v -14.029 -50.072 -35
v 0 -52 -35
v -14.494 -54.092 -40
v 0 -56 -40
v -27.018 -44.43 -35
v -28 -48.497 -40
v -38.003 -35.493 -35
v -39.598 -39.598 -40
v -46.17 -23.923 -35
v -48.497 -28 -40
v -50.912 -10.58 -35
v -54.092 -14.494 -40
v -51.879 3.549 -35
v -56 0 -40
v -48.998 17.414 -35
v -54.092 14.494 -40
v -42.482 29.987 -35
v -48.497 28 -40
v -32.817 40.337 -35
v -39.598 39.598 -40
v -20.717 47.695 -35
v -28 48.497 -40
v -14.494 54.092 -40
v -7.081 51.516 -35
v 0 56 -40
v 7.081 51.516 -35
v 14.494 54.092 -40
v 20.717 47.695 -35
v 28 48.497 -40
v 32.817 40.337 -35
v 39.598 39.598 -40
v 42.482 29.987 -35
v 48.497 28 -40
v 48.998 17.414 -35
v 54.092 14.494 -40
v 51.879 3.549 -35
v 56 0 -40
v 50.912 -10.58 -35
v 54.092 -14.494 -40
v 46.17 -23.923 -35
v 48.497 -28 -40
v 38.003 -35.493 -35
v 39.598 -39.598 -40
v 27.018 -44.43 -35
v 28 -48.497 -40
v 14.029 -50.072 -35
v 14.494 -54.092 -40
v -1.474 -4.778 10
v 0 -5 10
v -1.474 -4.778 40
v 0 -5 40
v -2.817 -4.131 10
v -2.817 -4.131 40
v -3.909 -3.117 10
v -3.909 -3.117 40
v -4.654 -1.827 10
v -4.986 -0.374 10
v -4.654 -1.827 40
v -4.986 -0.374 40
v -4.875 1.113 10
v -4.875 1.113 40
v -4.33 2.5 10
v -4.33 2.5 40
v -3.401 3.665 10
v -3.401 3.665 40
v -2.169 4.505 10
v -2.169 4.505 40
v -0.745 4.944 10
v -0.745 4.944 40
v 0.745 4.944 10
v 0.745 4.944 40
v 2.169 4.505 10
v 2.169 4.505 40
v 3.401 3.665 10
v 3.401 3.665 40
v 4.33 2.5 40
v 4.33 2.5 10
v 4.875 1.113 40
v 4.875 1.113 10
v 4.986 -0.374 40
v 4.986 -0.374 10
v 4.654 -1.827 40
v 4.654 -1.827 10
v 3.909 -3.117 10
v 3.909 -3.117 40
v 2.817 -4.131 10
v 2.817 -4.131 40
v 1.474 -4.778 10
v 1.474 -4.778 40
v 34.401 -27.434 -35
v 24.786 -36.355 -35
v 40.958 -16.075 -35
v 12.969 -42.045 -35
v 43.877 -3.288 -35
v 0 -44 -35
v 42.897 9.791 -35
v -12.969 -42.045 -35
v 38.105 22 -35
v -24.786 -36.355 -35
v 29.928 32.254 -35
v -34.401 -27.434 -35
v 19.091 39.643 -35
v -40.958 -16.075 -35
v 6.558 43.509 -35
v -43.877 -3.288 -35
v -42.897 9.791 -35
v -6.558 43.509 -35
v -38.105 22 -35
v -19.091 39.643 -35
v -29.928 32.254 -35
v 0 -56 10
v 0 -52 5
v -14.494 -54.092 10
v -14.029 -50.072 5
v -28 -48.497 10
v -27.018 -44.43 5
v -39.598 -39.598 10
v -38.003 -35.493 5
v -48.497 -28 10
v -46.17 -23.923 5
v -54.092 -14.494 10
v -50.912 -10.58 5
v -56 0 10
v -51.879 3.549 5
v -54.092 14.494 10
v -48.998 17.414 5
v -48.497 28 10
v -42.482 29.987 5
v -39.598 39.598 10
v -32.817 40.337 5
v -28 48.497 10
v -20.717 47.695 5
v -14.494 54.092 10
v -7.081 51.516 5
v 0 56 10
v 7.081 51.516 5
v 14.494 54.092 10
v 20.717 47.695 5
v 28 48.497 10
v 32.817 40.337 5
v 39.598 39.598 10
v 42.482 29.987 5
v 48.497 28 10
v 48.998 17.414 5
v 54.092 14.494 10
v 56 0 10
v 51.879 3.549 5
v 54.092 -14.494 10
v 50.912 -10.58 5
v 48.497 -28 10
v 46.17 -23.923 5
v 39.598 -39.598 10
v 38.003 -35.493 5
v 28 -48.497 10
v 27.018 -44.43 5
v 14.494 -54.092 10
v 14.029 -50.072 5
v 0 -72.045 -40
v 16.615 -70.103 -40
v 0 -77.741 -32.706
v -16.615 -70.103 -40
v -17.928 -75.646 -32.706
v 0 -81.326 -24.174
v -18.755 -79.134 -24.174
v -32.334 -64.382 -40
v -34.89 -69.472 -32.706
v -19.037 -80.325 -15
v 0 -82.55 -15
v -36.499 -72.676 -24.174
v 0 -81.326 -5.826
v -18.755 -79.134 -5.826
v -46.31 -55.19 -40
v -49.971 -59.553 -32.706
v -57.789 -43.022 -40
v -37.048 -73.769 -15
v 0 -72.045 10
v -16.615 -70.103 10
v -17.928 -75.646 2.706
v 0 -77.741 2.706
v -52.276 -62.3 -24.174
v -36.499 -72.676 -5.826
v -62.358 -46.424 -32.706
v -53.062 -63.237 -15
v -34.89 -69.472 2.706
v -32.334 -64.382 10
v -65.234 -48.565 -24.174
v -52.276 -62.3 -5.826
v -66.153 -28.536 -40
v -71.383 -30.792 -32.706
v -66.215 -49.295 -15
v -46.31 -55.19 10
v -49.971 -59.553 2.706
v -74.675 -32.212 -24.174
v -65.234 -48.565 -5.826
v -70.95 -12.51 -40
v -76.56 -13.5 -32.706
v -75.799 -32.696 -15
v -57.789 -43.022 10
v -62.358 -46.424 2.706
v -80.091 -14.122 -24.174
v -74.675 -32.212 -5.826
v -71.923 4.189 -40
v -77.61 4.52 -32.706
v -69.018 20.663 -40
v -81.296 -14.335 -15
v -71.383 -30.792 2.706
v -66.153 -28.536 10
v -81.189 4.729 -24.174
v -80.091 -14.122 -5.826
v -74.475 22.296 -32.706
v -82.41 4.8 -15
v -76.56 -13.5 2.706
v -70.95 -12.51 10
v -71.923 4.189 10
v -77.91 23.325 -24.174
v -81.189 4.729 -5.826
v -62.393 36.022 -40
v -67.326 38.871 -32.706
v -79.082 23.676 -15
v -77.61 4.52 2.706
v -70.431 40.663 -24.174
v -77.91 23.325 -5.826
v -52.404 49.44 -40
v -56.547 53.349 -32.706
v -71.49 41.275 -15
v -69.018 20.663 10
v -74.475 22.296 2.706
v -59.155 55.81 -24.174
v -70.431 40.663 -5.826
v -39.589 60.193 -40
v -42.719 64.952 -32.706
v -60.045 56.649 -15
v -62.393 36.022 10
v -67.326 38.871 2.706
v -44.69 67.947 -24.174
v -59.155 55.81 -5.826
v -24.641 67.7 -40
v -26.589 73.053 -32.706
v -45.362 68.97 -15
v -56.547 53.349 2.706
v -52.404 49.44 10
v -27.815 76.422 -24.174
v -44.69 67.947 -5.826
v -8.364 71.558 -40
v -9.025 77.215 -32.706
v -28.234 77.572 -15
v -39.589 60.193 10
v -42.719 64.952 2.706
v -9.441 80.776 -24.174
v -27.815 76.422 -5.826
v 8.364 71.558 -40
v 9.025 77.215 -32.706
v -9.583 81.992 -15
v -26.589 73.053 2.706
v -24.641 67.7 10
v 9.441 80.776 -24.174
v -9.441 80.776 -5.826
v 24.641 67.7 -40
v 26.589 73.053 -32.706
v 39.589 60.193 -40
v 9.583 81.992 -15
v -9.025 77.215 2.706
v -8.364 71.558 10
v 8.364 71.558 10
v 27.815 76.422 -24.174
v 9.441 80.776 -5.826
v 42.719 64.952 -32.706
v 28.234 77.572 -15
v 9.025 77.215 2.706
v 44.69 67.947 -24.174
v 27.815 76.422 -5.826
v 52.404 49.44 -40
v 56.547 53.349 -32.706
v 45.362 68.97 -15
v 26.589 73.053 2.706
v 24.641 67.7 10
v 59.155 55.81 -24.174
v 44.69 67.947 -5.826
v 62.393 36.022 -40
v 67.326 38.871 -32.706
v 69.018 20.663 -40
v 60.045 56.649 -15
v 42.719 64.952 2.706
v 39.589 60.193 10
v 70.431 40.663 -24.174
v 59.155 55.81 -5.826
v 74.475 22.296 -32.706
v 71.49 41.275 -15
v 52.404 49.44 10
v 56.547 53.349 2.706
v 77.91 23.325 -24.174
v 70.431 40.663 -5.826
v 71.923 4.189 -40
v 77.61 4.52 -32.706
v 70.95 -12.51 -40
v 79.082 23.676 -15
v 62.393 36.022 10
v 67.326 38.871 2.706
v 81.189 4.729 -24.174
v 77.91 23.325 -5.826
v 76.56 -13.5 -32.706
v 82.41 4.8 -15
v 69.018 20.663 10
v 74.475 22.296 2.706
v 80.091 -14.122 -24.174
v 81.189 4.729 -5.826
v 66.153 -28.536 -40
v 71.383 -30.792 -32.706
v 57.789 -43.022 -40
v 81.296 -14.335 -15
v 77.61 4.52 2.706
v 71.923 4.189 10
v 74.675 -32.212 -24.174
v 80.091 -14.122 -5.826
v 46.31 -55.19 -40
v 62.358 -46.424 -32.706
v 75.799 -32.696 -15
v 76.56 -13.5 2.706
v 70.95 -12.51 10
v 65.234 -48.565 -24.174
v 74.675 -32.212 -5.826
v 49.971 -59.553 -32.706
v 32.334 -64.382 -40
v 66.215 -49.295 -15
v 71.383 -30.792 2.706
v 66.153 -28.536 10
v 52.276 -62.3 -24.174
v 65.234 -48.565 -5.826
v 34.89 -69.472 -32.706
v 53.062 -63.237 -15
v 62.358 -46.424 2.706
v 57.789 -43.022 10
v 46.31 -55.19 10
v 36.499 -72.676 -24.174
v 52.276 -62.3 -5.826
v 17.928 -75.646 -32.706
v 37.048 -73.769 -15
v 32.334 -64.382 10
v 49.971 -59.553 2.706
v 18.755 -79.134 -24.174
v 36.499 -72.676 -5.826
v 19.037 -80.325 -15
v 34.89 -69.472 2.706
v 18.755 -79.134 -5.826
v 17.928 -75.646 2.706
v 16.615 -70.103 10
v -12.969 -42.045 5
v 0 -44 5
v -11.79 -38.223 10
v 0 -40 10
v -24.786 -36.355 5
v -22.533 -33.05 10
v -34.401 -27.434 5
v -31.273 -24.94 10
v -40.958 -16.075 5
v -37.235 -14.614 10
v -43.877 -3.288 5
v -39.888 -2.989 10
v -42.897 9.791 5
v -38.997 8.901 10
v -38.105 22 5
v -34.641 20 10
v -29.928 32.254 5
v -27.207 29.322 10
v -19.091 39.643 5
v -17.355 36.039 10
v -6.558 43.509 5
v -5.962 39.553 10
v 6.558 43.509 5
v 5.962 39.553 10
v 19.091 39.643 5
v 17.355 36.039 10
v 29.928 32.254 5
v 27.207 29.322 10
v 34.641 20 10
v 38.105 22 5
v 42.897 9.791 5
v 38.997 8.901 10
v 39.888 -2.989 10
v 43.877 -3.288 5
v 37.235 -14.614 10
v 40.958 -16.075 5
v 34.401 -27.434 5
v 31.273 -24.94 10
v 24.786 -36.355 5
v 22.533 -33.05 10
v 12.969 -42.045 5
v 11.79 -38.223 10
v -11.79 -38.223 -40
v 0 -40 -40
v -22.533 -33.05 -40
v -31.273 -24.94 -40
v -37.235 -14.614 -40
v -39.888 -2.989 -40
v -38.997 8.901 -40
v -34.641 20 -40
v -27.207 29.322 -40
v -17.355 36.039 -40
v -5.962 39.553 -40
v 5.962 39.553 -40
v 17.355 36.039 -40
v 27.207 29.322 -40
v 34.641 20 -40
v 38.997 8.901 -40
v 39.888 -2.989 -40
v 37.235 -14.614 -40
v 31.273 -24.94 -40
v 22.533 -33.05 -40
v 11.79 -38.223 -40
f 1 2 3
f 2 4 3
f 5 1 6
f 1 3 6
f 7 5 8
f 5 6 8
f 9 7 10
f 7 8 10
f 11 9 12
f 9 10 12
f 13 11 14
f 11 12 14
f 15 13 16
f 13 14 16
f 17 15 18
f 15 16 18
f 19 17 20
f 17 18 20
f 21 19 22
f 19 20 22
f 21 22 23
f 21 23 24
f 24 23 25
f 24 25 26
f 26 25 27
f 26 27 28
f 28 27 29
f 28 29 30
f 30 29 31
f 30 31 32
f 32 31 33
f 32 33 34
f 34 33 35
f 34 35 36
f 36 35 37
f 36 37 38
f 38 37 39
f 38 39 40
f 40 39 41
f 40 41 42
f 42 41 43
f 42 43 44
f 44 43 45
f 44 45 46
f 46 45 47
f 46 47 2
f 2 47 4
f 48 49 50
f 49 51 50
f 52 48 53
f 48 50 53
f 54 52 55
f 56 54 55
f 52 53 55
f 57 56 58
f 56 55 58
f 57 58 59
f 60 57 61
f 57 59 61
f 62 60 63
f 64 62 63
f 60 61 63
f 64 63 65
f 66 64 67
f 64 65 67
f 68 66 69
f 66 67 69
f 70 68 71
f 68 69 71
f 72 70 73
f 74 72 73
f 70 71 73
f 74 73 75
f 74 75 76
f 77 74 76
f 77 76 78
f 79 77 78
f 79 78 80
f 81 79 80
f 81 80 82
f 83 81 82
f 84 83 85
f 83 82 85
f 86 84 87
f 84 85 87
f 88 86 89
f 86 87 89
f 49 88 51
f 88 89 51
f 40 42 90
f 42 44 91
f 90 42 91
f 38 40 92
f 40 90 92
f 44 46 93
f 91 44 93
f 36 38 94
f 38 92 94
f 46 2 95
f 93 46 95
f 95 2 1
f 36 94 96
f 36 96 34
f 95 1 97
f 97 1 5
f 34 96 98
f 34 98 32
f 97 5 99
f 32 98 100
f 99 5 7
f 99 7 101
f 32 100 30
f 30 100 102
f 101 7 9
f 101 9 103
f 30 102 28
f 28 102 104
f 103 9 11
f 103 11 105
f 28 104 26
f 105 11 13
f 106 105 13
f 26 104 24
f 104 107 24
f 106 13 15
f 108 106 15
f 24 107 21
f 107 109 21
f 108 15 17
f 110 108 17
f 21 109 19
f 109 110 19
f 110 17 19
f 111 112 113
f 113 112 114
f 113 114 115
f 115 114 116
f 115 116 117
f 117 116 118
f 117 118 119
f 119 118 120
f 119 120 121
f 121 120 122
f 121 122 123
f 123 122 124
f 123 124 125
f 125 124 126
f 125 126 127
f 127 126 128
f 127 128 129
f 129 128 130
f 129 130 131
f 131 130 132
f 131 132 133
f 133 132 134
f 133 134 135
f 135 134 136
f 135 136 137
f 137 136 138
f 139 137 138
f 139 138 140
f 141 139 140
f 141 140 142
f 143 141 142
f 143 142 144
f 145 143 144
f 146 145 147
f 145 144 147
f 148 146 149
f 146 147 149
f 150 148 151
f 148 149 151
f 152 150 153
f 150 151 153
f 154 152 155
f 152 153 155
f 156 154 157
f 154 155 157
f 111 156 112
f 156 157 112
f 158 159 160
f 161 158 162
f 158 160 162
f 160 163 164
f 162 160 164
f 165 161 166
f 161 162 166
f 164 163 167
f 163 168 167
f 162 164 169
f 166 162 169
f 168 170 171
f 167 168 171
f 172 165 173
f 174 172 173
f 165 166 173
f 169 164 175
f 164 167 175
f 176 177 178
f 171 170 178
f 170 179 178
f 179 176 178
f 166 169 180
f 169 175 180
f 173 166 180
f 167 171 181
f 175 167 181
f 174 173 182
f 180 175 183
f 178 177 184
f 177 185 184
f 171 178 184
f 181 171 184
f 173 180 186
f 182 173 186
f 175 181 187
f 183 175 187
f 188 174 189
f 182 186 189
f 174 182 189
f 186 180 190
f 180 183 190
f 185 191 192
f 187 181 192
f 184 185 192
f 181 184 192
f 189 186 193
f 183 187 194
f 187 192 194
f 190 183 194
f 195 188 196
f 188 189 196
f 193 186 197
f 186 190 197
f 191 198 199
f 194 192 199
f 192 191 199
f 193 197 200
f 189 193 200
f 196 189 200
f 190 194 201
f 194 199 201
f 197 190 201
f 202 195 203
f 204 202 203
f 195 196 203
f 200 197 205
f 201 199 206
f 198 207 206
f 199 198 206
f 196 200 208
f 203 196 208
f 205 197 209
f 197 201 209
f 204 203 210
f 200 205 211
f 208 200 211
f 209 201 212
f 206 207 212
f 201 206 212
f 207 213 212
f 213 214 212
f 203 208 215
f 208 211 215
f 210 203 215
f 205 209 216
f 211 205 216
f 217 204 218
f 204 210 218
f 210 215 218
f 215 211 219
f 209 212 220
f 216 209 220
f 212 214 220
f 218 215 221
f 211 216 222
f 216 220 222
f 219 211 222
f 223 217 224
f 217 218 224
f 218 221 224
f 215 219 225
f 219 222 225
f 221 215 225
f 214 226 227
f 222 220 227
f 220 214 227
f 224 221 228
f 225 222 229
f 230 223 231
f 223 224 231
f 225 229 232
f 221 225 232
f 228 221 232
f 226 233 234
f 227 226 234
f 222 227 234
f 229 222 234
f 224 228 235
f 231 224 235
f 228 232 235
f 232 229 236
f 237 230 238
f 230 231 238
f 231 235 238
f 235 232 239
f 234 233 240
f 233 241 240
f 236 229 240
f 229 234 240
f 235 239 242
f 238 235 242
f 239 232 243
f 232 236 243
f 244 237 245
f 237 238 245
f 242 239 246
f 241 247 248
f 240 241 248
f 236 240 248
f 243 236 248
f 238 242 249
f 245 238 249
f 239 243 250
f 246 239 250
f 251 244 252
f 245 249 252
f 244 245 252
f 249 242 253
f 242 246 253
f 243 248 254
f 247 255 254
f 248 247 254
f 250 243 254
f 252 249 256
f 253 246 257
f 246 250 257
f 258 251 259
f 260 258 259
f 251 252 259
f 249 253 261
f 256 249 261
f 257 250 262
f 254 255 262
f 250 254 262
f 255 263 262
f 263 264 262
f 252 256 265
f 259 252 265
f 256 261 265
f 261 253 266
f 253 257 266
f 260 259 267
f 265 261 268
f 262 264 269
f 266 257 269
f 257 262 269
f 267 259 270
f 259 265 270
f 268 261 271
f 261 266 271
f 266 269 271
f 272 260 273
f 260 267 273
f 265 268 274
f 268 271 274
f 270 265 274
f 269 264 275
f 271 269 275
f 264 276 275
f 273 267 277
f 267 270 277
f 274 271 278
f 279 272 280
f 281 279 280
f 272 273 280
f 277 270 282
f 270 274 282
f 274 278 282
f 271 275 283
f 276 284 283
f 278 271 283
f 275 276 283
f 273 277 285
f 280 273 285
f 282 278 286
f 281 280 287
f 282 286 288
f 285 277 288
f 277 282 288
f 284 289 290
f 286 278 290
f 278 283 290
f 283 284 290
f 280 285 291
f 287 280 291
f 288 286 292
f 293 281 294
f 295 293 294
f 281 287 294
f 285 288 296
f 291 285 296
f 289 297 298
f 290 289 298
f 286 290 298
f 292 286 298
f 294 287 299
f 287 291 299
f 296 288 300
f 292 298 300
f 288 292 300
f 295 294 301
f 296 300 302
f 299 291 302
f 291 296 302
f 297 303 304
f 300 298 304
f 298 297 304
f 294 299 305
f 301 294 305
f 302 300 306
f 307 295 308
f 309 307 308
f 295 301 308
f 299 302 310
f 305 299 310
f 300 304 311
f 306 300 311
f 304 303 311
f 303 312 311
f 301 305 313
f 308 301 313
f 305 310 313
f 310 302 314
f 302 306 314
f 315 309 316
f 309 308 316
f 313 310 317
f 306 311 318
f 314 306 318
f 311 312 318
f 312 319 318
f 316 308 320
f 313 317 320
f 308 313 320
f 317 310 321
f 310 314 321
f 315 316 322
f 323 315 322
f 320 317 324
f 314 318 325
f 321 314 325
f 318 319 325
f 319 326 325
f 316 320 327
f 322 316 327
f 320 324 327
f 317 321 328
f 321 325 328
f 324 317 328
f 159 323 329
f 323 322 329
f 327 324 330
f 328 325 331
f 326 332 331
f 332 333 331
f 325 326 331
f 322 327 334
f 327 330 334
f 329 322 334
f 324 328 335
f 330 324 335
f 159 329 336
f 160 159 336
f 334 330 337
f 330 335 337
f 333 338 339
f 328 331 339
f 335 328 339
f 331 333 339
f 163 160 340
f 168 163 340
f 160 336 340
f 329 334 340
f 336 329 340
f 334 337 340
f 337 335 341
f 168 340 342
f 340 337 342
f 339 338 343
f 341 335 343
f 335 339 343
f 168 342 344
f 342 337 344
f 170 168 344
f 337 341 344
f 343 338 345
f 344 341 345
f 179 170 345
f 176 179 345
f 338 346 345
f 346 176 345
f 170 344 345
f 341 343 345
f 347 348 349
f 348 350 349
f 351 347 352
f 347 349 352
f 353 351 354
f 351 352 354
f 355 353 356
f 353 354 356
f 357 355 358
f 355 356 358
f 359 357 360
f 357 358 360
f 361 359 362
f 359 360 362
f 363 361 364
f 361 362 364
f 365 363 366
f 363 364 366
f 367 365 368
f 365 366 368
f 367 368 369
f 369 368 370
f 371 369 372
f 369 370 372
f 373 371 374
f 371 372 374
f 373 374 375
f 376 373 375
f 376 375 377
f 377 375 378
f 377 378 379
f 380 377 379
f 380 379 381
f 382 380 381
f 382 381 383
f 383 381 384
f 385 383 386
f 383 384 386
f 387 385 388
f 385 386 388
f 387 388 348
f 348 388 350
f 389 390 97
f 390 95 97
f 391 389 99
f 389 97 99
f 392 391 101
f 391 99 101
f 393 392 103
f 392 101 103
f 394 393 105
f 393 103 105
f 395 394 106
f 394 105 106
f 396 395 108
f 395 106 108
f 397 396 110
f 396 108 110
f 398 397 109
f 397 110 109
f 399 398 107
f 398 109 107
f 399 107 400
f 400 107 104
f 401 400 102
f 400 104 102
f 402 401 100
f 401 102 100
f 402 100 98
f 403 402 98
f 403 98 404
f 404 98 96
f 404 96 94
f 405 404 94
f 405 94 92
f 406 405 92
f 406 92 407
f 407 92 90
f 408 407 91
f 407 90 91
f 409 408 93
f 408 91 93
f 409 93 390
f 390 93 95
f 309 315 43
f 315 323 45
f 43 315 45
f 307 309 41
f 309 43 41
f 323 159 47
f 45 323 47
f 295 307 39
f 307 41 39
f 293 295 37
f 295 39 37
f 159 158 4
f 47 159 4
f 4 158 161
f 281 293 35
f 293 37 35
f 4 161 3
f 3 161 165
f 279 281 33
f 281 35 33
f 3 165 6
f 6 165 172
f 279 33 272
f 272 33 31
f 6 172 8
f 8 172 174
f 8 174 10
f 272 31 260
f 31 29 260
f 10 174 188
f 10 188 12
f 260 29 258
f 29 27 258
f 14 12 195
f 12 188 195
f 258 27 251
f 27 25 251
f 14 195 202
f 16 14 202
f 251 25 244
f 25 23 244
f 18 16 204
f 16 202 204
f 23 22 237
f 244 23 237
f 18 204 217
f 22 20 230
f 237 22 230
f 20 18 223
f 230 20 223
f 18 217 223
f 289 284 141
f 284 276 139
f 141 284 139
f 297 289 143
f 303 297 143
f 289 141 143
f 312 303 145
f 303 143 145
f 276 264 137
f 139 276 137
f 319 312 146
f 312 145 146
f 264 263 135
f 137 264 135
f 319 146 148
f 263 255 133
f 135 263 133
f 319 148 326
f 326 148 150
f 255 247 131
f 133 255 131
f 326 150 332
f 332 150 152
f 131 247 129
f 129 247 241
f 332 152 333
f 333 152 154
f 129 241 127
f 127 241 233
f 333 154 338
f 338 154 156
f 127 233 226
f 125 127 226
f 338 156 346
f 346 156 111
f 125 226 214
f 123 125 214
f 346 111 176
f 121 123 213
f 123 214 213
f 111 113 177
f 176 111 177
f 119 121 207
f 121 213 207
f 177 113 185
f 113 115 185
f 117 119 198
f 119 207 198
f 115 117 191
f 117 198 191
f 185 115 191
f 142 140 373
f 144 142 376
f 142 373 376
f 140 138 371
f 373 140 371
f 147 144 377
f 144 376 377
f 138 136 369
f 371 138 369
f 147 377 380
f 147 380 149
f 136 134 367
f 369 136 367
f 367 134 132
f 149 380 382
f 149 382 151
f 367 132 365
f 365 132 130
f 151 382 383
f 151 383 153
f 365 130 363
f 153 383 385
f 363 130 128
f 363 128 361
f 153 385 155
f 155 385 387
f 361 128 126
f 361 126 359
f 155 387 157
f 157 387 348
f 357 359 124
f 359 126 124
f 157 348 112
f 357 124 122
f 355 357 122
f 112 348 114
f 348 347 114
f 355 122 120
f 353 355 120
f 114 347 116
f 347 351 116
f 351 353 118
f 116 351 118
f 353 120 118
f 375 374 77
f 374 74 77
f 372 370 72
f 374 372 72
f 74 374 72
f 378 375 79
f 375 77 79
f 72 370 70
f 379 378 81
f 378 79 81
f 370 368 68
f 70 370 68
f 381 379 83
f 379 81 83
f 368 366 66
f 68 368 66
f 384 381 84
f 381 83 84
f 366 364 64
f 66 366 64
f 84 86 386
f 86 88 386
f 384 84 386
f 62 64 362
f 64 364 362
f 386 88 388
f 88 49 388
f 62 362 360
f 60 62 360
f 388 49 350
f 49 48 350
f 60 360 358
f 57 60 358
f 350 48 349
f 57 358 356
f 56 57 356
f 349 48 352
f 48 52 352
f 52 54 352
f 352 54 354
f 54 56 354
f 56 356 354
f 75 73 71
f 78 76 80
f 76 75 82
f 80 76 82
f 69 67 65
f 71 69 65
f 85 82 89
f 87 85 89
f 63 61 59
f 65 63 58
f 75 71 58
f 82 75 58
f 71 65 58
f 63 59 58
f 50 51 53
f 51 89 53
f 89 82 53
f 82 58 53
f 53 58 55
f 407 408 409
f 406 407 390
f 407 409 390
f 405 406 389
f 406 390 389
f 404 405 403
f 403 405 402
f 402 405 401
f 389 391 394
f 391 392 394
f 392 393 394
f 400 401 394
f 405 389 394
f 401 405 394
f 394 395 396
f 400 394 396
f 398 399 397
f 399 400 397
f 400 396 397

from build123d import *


with BuildPart() as part:
    # Croquis1 → Revolución1 (revolve)
    with BuildSketch(Plane(origin=(0, 0, 0), x_dir=(0, 0, -1), z_dir=(1, 0, 0))):
        with BuildLine():
            Line((-40, 0), (40, 0))
            Line((40, 0), (40, -40))
            Line((40, -40), (35, -44))
            Line((35, -44), (35, -52))
            Line((35, -52), (40, -56))
            Line((40, -56), (40, -72.044897428))
            ThreePointArc((40, -72.044897428), (15, -82.55), (-10, -72.044897428))
            Line((-10, -72.044897428), (-10, -56))
            Line((-10, -56), (-5, -52))
            Line((-5, -52), (-5, -44))
            Line((-5, -44), (-10, -40))
            Line((-10, -40), (-10, -5))
            Line((-10, -5), (-40, -5))
            Line((-40, -5), (-40, 0))
        make_face()
    revolve(axis=Axis((0, 0, 40), (0, 0, -1)))


solid = part.part
